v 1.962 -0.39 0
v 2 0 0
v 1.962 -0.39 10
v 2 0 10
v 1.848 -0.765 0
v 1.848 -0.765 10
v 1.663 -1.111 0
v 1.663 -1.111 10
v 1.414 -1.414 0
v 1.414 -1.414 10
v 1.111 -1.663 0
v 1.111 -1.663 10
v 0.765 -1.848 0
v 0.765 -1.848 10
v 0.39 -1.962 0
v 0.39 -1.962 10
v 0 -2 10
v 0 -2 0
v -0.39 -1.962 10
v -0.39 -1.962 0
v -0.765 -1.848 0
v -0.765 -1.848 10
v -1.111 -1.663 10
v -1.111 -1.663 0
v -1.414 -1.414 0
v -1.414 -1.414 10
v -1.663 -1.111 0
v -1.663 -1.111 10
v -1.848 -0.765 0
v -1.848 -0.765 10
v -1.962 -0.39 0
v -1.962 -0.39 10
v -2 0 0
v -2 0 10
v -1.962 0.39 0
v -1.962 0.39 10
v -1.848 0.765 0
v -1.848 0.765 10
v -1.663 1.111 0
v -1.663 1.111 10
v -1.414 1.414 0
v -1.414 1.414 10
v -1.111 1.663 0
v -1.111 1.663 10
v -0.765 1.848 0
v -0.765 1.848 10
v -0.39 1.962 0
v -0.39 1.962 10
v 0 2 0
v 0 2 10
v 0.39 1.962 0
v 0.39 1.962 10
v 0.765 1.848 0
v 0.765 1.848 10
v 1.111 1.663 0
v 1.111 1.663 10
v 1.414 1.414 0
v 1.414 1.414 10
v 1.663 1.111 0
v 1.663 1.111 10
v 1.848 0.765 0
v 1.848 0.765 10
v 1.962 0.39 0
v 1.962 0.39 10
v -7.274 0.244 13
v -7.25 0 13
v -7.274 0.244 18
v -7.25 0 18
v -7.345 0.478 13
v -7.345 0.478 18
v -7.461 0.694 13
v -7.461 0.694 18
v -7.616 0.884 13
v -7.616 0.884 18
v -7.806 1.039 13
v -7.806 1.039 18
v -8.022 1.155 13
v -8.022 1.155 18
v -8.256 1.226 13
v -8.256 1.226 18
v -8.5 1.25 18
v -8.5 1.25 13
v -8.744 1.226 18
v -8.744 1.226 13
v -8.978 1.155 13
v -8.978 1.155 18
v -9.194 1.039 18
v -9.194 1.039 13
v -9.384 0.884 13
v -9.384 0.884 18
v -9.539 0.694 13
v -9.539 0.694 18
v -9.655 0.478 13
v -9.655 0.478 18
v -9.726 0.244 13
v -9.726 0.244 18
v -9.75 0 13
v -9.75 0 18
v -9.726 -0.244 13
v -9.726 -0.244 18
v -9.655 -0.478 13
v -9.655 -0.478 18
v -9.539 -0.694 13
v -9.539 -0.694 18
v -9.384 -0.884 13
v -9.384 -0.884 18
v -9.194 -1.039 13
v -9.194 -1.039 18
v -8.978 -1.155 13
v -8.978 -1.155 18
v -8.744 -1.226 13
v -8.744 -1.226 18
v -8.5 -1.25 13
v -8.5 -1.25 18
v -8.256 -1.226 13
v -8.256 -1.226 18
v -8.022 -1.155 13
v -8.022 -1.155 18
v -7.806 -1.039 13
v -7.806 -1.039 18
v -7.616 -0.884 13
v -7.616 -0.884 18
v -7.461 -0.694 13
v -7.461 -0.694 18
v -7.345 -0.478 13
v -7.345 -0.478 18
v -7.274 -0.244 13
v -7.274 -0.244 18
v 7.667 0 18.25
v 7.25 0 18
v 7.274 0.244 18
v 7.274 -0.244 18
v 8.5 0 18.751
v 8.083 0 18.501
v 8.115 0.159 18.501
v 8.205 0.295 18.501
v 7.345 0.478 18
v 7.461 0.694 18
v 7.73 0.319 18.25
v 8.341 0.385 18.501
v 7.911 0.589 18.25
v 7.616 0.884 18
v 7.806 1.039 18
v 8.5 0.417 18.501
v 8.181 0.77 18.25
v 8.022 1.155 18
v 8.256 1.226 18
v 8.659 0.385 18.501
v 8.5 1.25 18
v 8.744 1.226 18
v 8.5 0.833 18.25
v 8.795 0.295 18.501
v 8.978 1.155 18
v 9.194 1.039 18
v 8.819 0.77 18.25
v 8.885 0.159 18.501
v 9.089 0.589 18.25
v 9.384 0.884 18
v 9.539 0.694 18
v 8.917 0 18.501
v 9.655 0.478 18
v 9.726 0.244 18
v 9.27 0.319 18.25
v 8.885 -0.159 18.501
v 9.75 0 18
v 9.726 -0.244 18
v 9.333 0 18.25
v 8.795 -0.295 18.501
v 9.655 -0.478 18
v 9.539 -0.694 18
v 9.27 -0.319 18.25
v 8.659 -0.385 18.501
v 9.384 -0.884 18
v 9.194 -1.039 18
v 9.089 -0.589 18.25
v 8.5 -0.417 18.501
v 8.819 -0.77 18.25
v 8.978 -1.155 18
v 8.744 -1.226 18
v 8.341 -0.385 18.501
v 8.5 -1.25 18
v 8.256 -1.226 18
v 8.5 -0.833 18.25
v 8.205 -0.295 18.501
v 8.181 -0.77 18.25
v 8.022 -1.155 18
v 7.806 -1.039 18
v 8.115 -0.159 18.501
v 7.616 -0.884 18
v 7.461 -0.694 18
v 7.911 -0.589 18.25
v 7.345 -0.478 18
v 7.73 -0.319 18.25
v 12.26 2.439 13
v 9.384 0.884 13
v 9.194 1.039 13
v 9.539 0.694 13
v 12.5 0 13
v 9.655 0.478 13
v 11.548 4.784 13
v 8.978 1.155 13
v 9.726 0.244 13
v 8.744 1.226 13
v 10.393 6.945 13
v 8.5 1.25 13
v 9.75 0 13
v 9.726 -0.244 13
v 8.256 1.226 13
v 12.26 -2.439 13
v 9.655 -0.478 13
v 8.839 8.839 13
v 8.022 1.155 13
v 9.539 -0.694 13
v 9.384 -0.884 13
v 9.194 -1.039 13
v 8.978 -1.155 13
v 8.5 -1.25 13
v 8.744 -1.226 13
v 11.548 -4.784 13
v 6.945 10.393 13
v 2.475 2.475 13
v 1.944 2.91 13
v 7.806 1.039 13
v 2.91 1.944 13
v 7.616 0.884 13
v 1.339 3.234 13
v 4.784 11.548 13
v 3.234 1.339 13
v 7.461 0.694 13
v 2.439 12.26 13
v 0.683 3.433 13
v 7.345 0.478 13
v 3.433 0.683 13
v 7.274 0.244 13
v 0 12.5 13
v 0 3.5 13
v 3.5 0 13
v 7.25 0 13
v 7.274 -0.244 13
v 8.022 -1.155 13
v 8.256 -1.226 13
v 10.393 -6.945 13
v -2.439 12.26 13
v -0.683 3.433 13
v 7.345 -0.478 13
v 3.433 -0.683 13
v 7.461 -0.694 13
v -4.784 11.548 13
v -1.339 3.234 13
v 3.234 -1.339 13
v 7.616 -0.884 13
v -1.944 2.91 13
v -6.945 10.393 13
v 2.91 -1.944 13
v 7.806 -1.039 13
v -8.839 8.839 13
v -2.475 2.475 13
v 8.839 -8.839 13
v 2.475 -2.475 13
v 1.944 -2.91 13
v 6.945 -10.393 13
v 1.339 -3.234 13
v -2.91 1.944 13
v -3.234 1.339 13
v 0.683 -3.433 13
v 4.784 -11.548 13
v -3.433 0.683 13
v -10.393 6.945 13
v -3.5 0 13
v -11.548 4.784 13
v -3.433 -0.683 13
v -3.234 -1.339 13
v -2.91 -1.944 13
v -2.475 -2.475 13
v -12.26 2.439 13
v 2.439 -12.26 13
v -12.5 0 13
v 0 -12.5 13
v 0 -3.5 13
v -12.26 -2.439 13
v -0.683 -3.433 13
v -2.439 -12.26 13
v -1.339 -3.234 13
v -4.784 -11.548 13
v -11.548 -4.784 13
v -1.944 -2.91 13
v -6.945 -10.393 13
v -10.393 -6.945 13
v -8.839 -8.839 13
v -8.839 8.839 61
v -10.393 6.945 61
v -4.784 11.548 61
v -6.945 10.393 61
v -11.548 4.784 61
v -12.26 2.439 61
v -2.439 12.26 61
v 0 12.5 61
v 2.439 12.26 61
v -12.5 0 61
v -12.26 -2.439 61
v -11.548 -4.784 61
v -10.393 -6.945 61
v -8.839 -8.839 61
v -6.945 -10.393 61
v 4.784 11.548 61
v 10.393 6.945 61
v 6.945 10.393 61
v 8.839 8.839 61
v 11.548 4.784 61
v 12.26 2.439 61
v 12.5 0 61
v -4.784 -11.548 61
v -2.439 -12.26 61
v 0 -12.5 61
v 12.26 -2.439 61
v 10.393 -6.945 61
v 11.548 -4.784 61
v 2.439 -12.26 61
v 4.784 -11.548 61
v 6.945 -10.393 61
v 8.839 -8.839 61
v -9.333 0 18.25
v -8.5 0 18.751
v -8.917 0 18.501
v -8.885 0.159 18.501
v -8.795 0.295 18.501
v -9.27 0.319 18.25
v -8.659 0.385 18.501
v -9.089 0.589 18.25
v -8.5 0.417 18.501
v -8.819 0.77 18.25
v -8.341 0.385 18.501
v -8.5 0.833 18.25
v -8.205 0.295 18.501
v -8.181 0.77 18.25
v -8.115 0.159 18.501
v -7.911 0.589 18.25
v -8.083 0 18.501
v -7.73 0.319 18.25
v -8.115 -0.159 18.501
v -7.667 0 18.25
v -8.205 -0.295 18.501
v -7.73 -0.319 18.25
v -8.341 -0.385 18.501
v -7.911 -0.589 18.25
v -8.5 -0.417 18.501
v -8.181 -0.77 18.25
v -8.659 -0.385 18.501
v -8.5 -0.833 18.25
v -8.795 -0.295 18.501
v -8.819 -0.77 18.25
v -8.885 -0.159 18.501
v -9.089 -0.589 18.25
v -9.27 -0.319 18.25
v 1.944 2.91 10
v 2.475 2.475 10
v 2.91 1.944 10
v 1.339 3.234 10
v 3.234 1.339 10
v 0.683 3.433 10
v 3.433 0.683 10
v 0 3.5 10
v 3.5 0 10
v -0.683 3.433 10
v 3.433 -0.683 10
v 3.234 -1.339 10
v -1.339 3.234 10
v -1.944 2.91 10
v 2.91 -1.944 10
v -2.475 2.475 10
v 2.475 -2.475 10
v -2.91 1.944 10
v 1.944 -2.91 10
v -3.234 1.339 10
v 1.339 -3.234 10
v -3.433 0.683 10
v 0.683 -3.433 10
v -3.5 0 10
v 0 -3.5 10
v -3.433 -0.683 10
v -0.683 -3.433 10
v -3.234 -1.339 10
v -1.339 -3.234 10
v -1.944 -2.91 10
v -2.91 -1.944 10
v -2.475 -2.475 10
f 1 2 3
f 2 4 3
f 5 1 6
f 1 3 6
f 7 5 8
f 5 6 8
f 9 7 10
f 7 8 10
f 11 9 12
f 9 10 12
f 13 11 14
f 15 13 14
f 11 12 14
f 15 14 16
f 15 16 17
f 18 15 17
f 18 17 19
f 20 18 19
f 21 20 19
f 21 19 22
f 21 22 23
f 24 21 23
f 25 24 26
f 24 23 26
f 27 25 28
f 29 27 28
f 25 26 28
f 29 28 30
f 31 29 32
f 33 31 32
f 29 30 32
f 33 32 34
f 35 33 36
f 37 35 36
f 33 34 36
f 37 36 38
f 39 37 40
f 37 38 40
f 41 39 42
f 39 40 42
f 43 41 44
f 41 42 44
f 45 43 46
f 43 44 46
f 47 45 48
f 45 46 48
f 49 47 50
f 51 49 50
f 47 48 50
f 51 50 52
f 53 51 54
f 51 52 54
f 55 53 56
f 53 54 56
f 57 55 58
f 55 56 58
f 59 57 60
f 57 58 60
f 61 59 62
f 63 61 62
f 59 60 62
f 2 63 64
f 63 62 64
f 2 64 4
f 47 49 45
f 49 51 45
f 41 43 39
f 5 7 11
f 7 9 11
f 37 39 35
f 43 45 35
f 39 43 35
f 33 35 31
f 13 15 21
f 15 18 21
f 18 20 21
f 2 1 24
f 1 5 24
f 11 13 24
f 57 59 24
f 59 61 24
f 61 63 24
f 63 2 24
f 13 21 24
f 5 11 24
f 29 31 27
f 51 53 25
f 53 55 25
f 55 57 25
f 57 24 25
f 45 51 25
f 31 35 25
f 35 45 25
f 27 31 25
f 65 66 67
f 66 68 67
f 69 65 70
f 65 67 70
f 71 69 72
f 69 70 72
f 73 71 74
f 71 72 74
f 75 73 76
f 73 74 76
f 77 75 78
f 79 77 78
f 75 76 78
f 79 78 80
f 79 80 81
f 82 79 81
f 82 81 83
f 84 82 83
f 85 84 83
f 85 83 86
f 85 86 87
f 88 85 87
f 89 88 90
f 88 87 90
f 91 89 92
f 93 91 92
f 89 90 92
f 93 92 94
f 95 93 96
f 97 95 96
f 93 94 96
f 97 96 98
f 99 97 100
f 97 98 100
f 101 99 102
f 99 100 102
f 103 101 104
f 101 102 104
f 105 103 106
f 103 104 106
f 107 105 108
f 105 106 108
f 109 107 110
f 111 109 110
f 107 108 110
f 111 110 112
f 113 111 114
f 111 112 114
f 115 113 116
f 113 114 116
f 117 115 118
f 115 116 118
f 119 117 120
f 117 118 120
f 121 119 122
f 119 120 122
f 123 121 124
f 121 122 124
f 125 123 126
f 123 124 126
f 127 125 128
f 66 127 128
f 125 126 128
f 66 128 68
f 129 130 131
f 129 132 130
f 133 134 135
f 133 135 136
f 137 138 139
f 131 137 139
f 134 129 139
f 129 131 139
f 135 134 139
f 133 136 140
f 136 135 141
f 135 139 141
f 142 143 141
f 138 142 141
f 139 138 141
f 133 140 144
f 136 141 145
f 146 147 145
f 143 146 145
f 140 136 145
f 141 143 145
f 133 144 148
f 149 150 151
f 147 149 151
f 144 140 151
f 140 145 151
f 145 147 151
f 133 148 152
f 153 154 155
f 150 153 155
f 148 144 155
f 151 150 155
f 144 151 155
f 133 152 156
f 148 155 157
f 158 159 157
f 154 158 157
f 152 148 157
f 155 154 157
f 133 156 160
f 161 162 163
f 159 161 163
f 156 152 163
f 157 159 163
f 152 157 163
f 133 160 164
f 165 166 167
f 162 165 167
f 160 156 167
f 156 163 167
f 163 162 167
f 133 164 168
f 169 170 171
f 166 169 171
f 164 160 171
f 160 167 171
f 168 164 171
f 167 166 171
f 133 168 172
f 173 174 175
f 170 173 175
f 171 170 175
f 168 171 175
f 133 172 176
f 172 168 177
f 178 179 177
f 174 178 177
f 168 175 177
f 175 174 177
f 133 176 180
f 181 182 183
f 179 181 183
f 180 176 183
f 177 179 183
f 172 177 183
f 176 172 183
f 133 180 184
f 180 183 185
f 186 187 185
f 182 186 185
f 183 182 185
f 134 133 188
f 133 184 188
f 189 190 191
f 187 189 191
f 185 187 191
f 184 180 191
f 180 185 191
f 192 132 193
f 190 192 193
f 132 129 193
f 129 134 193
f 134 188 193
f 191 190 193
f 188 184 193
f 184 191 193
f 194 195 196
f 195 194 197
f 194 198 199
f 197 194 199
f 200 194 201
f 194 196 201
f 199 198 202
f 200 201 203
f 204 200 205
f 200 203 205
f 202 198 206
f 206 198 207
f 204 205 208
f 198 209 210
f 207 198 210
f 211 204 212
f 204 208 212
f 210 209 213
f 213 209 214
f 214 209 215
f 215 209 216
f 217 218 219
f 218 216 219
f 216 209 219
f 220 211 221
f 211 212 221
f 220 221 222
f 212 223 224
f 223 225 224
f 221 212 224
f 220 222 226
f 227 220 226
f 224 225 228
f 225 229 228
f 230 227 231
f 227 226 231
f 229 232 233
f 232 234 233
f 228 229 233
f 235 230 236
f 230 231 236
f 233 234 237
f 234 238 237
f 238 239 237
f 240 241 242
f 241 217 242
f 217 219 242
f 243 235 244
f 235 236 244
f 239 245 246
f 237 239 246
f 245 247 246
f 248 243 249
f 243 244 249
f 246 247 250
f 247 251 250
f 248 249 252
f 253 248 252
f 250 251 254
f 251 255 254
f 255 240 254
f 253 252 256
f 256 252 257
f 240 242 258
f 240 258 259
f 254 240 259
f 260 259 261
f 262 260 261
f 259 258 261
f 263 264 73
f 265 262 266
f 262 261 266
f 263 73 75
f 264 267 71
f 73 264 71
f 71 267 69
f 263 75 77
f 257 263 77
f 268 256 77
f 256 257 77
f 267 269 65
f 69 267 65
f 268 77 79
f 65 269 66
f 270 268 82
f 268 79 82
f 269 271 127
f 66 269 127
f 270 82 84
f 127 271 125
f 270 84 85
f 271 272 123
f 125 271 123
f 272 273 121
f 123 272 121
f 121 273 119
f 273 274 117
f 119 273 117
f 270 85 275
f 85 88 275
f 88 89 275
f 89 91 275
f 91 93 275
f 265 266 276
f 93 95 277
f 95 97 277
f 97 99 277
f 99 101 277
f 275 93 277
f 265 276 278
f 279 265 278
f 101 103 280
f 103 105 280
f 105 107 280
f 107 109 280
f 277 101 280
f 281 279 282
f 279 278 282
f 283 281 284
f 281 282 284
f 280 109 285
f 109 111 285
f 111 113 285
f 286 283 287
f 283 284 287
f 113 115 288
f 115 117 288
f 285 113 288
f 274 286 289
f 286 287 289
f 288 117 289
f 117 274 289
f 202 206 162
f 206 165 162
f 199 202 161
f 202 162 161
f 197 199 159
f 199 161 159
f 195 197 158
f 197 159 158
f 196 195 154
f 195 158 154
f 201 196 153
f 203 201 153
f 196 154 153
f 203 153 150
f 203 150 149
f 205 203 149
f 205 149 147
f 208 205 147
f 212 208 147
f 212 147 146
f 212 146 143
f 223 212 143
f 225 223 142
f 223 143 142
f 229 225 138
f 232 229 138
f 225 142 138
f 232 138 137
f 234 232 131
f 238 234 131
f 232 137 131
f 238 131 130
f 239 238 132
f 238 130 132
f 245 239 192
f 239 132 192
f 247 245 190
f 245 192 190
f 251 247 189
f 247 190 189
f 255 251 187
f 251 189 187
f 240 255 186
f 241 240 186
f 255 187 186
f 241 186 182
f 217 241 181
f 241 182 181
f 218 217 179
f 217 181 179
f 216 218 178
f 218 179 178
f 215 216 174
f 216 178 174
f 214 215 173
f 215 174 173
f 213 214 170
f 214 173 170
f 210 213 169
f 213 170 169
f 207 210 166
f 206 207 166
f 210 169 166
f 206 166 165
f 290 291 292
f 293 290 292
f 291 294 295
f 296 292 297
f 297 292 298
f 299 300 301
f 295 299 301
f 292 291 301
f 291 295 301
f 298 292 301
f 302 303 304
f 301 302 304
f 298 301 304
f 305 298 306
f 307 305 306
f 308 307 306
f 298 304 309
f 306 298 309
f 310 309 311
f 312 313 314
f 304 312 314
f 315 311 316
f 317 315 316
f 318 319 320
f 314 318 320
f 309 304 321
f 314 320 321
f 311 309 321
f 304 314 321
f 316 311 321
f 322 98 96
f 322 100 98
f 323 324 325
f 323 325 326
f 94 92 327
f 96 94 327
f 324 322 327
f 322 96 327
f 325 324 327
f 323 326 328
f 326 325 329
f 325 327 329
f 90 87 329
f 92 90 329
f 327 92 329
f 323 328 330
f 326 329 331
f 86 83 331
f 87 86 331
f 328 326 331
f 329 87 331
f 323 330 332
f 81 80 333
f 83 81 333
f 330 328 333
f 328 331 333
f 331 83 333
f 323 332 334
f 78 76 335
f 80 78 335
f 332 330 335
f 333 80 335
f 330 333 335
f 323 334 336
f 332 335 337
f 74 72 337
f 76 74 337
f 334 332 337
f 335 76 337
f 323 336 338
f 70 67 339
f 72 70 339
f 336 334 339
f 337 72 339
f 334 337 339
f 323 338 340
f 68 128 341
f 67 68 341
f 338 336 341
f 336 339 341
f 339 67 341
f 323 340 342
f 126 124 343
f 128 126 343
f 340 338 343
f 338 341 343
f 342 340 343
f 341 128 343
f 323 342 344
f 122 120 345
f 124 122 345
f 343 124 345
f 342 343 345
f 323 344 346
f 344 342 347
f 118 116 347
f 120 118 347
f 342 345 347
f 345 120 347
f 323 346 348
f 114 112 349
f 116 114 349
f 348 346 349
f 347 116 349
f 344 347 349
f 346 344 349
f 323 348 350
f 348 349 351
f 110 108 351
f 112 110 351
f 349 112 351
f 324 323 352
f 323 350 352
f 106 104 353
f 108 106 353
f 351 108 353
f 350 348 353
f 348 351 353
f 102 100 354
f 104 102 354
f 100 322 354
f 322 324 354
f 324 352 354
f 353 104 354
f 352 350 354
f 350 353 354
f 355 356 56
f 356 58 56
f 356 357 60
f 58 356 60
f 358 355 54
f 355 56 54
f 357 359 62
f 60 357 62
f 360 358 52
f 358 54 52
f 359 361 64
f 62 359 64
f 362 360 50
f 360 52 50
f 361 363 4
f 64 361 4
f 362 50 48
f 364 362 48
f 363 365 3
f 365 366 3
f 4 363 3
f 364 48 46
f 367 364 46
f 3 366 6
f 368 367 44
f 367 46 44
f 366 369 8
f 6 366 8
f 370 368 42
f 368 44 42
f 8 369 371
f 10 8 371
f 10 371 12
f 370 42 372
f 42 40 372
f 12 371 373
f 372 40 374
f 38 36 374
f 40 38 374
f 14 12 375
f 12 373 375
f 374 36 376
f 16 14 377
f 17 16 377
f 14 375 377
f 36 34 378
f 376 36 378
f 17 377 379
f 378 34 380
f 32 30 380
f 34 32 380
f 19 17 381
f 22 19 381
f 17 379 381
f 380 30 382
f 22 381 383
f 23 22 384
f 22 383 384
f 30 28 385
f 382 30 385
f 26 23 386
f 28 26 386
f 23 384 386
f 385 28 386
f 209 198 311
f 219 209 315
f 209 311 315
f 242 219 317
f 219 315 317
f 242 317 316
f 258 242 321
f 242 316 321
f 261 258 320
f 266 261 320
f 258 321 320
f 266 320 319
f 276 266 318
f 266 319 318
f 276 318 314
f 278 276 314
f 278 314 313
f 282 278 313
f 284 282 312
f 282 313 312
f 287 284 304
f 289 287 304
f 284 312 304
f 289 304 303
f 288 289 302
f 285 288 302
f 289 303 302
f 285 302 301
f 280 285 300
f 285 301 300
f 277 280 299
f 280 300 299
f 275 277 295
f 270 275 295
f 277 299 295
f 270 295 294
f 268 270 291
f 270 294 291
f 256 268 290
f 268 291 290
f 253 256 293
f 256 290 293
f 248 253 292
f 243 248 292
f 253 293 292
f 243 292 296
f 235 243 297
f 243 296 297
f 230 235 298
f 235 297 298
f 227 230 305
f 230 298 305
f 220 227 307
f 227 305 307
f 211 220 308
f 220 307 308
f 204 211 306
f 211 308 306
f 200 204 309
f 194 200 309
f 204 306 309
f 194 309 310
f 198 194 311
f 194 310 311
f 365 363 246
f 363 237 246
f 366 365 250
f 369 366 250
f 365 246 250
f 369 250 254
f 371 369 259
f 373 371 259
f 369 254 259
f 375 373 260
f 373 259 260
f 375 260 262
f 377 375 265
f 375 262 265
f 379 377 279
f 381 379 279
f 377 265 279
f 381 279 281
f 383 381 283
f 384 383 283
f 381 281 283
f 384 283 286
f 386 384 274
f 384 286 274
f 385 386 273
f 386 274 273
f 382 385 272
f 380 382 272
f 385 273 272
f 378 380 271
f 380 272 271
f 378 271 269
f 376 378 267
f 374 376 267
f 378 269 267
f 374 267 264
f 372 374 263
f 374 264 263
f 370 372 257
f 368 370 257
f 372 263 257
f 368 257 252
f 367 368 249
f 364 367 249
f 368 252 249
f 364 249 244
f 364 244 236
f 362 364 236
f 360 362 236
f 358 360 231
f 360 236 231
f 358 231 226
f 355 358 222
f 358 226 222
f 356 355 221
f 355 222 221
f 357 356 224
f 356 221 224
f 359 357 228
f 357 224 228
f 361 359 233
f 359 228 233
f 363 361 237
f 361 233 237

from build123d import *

# Parameters (mm, degrees)
TAP_DRILL_FOR_M3X0_5_TAP1_D     = 2.5
TAP_DRILL_FOR_M3X0_5_TAP1_DEPTH = 5
TAP_DRILL_FOR_M3X0_5_TAP1_TIP   = 0.751075774


with BuildPart() as part:
    # Sketch1 → Revolve1 (revolve)
    with BuildSketch(Plane(origin=(0, 0, 0), x_dir=(0, 0, -1), z_dir=(1, 0, 0)), mode=Mode.PRIVATE) as revolve1_sk:
        Polygon((0, 0), (0, -2), (-10, -2), (-10, -3.5), (-13, -3.5), (-13, -12.5), (-61, -12.5), (-61, 0), align=None)
    revolve(revolve1_sk.sketch.rotate(Axis((0, 0, 61), (0, 0, -1)), 270), axis=Axis((0, 0, 61), (0, 0, -1)))

    # Tap Drill for M3x0.5 Tap1
    with Locations(Plane(origin=(0, 0, 13), x_dir=(-1, 0, 0), z_dir=(0, 0, -1))):
        with Locations((-8.5, 0), (8.5, 0)):
            Hole(TAP_DRILL_FOR_M3X0_5_TAP1_D / 2, depth=TAP_DRILL_FOR_M3X0_5_TAP1_DEPTH)
            with Locations((0, 0, -(TAP_DRILL_FOR_M3X0_5_TAP1_DEPTH + TAP_DRILL_FOR_M3X0_5_TAP1_TIP / 2))):  # 118° drill point
                Cone(0, TAP_DRILL_FOR_M3X0_5_TAP1_D / 2, TAP_DRILL_FOR_M3X0_5_TAP1_TIP, mode=Mode.SUBTRACT)


solid = part.part
